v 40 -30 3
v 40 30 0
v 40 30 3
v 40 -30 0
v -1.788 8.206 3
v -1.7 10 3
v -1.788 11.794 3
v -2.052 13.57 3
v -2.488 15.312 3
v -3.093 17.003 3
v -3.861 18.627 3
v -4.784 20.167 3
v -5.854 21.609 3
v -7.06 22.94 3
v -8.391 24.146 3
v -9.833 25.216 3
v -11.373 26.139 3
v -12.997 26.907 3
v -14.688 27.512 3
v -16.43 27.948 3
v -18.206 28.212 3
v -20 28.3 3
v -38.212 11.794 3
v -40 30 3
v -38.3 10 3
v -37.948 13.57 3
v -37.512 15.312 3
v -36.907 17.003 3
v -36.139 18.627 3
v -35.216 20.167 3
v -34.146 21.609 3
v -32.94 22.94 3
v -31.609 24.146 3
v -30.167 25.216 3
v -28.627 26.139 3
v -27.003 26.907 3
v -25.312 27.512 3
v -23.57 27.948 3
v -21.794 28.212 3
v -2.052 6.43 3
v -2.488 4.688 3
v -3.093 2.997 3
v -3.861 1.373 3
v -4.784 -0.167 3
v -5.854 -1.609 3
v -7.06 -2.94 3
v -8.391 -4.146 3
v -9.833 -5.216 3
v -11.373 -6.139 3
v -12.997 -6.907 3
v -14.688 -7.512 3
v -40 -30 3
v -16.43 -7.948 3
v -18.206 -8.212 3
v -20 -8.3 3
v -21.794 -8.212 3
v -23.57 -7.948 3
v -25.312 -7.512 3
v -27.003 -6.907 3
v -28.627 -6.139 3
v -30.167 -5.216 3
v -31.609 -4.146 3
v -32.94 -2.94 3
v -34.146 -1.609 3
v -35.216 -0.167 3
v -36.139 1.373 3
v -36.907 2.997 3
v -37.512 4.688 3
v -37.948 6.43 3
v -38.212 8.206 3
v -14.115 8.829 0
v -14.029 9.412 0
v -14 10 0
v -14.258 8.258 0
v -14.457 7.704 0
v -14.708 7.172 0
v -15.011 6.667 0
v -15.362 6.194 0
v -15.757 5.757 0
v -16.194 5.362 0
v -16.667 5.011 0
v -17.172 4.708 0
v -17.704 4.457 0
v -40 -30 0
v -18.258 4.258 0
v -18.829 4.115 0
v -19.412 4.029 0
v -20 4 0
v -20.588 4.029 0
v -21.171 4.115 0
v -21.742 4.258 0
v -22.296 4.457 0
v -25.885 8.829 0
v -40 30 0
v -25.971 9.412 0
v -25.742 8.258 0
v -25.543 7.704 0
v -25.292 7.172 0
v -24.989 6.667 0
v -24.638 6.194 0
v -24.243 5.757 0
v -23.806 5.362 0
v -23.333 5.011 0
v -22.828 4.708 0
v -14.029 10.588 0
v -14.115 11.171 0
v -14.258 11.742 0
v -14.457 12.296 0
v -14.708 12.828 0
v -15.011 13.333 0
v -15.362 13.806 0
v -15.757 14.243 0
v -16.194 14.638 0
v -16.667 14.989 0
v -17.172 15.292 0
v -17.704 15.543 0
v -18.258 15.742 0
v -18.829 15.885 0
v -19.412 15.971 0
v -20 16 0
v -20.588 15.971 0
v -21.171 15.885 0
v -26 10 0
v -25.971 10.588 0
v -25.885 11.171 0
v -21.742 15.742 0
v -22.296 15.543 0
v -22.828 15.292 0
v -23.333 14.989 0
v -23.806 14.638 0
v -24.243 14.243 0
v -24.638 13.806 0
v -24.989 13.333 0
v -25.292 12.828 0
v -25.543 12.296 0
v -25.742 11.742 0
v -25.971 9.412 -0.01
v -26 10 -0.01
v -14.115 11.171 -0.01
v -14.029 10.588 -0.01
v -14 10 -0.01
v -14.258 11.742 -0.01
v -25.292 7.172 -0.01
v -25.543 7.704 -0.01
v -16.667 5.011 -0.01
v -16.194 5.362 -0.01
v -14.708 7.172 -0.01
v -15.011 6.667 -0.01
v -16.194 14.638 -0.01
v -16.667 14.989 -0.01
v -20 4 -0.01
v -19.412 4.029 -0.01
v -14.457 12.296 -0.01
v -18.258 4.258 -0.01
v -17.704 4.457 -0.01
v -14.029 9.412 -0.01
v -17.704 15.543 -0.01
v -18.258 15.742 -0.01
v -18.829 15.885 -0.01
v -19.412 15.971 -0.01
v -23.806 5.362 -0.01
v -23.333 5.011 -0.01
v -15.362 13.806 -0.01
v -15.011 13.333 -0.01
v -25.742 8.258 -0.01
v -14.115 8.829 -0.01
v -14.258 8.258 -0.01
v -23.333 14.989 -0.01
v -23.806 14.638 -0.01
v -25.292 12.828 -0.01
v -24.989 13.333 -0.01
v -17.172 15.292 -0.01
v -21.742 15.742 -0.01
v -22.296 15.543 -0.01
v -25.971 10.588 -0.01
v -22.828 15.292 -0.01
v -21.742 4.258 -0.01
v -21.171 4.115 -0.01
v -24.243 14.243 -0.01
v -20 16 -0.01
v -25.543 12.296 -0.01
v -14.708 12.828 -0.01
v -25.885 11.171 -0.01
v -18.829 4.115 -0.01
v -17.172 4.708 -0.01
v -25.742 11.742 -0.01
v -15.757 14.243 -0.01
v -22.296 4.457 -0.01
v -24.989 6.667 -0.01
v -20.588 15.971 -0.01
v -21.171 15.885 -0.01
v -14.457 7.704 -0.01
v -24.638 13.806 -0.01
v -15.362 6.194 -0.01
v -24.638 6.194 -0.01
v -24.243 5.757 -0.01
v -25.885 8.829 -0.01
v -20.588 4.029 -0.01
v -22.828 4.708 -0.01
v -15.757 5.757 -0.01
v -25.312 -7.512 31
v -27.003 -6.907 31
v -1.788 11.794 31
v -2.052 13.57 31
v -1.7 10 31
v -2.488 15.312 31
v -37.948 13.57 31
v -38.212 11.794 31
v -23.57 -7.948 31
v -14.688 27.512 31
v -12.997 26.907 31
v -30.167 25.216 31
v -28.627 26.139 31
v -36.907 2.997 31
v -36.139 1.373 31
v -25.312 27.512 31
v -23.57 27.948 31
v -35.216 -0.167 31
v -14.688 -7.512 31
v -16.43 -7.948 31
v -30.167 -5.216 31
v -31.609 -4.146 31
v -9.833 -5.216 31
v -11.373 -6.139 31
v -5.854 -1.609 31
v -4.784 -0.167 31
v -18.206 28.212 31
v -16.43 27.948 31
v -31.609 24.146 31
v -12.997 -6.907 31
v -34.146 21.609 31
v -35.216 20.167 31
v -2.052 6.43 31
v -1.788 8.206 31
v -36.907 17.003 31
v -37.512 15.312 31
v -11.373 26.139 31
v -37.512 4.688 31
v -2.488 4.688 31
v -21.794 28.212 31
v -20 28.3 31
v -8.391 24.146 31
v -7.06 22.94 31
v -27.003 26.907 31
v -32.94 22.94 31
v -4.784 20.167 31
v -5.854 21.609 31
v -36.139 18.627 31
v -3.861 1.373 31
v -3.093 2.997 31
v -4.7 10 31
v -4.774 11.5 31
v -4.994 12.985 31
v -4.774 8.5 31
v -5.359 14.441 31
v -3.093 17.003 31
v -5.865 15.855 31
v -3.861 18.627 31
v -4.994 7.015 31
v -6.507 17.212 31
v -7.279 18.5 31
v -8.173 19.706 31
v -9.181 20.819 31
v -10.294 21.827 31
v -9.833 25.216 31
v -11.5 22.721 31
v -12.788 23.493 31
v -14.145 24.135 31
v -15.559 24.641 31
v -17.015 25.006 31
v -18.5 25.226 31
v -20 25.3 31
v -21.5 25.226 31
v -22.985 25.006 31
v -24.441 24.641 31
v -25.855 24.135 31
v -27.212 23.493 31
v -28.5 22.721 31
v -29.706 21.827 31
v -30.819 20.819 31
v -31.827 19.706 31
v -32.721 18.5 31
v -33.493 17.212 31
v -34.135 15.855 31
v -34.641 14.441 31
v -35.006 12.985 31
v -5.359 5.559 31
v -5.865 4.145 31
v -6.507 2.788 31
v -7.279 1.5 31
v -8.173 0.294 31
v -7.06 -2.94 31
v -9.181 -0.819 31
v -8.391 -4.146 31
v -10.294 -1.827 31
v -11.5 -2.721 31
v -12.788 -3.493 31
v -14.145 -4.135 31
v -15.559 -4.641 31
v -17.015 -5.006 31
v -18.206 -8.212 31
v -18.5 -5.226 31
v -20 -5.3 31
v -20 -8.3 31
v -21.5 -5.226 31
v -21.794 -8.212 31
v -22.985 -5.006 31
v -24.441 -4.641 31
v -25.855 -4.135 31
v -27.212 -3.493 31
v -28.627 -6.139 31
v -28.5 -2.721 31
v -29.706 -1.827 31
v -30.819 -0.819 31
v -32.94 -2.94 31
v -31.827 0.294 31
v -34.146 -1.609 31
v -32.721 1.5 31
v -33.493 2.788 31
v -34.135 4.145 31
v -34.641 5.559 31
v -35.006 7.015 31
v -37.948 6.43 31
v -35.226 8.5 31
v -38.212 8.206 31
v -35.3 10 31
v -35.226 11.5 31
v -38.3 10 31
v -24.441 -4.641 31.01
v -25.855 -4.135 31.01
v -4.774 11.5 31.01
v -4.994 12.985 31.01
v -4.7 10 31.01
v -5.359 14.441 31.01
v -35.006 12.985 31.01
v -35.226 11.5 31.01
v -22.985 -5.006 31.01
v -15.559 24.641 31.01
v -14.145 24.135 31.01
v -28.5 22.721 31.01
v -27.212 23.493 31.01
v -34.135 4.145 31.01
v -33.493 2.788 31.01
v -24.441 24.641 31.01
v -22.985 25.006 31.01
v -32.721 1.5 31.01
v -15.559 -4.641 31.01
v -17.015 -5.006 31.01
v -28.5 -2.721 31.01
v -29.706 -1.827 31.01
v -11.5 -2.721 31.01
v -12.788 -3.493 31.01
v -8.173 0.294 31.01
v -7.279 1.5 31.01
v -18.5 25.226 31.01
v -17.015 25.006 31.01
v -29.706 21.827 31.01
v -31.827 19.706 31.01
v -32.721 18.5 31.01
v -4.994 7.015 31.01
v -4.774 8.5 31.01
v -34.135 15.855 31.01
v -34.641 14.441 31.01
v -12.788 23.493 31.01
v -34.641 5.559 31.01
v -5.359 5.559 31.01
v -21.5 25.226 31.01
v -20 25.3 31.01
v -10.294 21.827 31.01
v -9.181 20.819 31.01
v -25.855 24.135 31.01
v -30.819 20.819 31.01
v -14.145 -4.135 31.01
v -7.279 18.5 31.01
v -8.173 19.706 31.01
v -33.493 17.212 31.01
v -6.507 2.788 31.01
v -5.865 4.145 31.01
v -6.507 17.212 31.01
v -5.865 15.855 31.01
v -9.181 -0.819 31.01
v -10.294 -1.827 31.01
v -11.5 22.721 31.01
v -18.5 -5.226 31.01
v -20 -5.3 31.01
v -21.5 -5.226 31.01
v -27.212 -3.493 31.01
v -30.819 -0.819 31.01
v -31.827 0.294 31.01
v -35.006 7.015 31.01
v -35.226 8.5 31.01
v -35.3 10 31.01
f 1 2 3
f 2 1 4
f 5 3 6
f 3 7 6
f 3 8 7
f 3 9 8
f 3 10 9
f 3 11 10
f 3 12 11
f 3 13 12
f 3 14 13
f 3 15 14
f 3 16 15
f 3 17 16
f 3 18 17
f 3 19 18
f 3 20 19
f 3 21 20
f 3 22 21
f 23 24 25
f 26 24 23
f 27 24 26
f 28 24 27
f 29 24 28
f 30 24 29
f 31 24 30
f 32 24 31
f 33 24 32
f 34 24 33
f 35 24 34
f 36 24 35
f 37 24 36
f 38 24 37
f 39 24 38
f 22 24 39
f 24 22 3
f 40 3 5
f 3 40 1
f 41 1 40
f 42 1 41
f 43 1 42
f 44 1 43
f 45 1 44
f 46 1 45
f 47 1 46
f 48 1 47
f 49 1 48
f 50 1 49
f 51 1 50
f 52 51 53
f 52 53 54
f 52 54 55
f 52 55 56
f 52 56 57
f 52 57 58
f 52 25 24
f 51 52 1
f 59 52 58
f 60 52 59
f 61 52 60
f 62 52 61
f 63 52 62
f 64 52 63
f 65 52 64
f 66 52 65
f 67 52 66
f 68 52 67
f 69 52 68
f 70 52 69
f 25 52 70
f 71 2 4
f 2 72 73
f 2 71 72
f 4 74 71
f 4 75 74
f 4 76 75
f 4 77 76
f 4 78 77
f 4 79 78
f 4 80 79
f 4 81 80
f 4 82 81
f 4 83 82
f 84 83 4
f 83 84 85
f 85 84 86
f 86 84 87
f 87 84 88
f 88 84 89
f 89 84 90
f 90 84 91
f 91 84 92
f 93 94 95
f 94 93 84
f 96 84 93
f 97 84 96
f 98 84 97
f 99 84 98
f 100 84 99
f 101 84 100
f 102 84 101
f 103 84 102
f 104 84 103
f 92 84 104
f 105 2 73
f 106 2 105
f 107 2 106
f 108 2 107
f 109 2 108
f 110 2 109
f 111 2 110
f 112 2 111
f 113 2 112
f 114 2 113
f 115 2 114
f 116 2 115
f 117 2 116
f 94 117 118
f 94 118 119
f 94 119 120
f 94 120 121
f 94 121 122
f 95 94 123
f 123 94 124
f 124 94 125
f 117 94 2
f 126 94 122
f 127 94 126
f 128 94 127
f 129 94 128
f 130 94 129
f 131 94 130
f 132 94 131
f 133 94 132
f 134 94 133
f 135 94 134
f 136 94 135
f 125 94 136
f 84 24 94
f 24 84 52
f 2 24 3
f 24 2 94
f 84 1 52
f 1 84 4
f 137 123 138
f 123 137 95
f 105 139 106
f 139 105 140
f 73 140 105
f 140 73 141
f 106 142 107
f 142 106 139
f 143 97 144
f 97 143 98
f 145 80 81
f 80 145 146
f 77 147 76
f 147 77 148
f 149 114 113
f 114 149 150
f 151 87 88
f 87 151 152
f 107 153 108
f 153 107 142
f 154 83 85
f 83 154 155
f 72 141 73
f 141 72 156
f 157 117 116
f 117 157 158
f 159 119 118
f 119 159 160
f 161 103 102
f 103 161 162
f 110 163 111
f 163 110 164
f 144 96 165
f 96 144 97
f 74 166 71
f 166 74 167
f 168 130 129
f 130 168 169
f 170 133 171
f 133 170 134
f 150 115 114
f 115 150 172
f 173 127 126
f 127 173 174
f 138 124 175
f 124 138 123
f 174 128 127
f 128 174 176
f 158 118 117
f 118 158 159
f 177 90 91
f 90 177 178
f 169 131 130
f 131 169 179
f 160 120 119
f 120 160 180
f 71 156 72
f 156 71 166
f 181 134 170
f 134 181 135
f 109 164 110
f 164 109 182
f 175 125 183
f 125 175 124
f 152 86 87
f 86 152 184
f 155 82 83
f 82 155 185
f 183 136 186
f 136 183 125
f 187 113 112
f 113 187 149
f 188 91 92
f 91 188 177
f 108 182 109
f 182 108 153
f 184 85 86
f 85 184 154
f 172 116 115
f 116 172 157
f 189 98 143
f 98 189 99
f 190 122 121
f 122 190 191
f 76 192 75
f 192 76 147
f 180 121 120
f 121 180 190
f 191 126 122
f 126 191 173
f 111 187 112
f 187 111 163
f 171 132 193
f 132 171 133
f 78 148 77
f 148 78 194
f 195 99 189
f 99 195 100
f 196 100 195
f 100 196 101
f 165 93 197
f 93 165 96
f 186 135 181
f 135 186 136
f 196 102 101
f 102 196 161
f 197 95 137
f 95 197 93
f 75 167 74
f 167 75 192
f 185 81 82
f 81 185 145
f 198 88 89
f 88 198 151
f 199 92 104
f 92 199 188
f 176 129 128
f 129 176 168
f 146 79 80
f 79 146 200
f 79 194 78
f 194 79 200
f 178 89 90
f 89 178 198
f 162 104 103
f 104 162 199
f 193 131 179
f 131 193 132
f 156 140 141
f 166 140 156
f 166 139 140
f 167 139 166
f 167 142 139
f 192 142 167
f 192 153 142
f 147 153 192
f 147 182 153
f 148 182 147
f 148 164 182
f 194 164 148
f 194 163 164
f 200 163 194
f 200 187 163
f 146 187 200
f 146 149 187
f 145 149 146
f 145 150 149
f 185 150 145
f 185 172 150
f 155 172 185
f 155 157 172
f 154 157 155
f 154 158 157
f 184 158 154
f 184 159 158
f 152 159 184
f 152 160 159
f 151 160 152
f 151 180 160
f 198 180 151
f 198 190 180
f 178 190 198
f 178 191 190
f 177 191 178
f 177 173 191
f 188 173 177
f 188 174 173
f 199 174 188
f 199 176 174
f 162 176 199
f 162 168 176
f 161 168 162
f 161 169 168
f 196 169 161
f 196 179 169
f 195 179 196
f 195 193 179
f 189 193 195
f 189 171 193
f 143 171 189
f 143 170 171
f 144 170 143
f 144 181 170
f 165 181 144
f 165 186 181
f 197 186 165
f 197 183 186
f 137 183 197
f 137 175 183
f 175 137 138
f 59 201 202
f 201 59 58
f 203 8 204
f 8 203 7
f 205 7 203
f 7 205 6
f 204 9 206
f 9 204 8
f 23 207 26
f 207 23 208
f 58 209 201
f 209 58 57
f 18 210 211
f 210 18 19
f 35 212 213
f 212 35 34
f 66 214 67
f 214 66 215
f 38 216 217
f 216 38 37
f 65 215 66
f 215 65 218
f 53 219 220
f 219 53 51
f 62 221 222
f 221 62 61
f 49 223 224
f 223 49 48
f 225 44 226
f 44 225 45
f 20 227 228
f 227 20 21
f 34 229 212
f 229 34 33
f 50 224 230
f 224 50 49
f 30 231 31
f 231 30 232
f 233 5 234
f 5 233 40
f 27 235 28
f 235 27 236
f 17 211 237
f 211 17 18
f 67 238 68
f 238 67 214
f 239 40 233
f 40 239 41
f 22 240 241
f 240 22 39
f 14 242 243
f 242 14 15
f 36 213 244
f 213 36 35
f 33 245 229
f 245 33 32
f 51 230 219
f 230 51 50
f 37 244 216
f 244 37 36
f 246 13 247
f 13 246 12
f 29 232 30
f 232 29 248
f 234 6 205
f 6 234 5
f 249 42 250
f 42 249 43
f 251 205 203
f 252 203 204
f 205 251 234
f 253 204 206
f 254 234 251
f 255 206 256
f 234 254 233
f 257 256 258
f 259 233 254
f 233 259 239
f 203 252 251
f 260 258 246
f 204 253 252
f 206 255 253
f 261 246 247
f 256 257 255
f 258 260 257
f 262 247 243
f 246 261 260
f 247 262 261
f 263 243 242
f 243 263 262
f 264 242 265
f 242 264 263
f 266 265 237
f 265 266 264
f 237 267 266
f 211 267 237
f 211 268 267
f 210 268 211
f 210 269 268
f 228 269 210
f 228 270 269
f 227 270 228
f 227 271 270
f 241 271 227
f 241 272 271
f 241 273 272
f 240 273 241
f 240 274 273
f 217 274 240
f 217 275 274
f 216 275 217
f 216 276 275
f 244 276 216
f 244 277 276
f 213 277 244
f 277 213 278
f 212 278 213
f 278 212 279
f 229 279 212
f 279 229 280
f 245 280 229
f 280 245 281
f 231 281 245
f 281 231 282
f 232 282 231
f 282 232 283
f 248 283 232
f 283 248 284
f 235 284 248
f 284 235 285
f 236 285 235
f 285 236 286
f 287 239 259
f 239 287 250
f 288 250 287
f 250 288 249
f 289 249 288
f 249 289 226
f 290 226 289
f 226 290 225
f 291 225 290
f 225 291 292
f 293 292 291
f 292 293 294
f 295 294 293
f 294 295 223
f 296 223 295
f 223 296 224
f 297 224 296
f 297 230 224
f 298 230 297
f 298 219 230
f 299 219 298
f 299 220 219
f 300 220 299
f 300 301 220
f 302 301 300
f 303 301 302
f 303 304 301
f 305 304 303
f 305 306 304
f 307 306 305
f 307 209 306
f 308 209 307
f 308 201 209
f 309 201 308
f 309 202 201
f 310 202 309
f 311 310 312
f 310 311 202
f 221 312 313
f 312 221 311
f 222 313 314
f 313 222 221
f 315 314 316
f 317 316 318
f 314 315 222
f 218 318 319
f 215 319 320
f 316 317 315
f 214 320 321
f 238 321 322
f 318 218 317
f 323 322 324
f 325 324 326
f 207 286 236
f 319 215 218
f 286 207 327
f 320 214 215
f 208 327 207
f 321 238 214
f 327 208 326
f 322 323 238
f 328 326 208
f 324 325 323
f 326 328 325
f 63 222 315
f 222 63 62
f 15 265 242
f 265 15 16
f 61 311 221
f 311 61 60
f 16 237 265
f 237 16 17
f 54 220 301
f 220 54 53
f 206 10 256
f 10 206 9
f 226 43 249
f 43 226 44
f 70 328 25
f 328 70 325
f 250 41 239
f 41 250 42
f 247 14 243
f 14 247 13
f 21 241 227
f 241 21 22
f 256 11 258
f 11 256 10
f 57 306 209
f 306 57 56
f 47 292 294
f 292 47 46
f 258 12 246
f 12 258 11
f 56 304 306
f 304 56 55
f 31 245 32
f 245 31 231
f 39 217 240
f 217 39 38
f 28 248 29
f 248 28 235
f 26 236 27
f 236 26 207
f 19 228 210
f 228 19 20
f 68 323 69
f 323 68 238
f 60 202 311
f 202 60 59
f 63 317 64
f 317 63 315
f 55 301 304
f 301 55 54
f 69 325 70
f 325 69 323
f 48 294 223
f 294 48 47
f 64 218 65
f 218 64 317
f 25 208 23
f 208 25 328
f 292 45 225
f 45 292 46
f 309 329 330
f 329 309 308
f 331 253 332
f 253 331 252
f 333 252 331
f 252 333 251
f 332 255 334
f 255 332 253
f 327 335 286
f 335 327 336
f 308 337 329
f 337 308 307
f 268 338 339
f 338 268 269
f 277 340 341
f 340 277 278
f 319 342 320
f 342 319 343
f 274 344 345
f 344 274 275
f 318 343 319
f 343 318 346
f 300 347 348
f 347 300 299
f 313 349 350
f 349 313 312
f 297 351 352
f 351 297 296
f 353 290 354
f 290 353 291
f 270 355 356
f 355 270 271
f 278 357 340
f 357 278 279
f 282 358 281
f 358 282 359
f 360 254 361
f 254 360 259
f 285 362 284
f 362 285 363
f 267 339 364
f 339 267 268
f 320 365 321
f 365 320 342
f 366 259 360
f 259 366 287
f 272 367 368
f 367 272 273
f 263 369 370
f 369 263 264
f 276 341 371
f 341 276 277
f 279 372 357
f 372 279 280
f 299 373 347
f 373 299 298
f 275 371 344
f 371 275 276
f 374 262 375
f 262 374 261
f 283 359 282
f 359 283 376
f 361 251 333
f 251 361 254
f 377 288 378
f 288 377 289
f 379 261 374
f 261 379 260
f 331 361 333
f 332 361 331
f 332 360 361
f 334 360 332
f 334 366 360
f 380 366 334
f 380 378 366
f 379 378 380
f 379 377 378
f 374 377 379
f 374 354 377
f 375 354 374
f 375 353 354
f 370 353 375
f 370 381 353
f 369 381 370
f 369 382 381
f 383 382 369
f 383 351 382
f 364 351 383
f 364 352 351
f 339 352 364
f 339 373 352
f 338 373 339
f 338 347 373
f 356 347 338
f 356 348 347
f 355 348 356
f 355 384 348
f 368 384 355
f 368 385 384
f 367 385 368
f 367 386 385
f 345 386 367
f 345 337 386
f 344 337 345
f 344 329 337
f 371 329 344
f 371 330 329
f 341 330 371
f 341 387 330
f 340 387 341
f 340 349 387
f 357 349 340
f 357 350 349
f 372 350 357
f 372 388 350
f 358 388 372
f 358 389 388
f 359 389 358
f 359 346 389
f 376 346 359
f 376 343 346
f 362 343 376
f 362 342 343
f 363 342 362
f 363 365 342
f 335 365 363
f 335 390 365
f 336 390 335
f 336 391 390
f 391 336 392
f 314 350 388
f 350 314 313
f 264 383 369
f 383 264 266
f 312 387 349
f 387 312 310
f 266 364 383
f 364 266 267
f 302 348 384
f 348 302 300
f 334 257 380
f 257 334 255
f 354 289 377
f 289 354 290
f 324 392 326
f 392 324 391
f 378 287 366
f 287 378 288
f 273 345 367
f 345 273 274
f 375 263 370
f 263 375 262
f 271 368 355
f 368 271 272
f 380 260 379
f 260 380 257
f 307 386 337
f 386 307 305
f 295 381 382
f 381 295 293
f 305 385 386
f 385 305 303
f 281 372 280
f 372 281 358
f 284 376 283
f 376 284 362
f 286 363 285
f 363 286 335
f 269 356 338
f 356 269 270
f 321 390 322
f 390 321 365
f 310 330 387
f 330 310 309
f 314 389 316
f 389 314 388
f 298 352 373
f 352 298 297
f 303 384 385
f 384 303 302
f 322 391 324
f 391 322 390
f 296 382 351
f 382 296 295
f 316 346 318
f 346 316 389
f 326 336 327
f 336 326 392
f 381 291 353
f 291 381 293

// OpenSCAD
// Dimensions (mm)
plate_x = 80;
plate_y = 60;
plate_z = 3;

cam_hole_d = 12;
cam_hole_x = -20;
cam_hole_y = 10;

sleeve_od = 36.6;
sleeve_z_start = 3;
sleeve_z_end = 31;

bore1_d = 22;
bore1_z_start = 3;
bore1_z_end = 11;

bore2_d = 30.6;
bore2_z_start = 11;
bore2_z_end = 31;

m3_hole_d = 2.5;
m3_z = 21;

$fn = 64;

// Plate
translate([-plate_x/2, -plate_y/2, 0])
  cube([plate_x, plate_y, plate_z]);

// Camera hole through plate
translate([cam_hole_x, cam_hole_y, -0.01])
  cylinder(h = plate_z + 0.02, r = cam_hole_d/2, $fn = $fn);

// Sleeve body
translate([cam_hole_x, cam_hole_y, sleeve_z_start])
  cylinder(h = sleeve_z_end - sleeve_z_start, r = sleeve_od/2, $fn = $fn);

// Bore 1 (stop)
translate([cam_hole_x, cam_hole_y, bore1_z_start])
  cylinder(h = bore1_z_end - bore1_z_start + 0.01, r = bore1_d/2, $fn = $fn);

// Bore 2 (open top)
translate([cam_hole_x, cam_hole_y, bore2_z_start])
  cylinder(h = bore2_z_end - bore2_z_start + 0.01, r = bore2_d/2, $fn = $fn);

// M3 centring screw holes
for (i = [0:2]) {
  angle = i * 120;
  // Radius to the middle of the sleeve wall
  wall_r = (sleeve_od/2 + bore2_d/2) / 2;
  hx = cam_hole_x + wall_r * cos(angle);
  hy = cam_hole_y + wall_r * sin(angle);
  translate([hx, hy, m3_z - 0.01])
    cylinder(h = 0.02, r = m3_hole_d/2, $fn = $fn);
}
